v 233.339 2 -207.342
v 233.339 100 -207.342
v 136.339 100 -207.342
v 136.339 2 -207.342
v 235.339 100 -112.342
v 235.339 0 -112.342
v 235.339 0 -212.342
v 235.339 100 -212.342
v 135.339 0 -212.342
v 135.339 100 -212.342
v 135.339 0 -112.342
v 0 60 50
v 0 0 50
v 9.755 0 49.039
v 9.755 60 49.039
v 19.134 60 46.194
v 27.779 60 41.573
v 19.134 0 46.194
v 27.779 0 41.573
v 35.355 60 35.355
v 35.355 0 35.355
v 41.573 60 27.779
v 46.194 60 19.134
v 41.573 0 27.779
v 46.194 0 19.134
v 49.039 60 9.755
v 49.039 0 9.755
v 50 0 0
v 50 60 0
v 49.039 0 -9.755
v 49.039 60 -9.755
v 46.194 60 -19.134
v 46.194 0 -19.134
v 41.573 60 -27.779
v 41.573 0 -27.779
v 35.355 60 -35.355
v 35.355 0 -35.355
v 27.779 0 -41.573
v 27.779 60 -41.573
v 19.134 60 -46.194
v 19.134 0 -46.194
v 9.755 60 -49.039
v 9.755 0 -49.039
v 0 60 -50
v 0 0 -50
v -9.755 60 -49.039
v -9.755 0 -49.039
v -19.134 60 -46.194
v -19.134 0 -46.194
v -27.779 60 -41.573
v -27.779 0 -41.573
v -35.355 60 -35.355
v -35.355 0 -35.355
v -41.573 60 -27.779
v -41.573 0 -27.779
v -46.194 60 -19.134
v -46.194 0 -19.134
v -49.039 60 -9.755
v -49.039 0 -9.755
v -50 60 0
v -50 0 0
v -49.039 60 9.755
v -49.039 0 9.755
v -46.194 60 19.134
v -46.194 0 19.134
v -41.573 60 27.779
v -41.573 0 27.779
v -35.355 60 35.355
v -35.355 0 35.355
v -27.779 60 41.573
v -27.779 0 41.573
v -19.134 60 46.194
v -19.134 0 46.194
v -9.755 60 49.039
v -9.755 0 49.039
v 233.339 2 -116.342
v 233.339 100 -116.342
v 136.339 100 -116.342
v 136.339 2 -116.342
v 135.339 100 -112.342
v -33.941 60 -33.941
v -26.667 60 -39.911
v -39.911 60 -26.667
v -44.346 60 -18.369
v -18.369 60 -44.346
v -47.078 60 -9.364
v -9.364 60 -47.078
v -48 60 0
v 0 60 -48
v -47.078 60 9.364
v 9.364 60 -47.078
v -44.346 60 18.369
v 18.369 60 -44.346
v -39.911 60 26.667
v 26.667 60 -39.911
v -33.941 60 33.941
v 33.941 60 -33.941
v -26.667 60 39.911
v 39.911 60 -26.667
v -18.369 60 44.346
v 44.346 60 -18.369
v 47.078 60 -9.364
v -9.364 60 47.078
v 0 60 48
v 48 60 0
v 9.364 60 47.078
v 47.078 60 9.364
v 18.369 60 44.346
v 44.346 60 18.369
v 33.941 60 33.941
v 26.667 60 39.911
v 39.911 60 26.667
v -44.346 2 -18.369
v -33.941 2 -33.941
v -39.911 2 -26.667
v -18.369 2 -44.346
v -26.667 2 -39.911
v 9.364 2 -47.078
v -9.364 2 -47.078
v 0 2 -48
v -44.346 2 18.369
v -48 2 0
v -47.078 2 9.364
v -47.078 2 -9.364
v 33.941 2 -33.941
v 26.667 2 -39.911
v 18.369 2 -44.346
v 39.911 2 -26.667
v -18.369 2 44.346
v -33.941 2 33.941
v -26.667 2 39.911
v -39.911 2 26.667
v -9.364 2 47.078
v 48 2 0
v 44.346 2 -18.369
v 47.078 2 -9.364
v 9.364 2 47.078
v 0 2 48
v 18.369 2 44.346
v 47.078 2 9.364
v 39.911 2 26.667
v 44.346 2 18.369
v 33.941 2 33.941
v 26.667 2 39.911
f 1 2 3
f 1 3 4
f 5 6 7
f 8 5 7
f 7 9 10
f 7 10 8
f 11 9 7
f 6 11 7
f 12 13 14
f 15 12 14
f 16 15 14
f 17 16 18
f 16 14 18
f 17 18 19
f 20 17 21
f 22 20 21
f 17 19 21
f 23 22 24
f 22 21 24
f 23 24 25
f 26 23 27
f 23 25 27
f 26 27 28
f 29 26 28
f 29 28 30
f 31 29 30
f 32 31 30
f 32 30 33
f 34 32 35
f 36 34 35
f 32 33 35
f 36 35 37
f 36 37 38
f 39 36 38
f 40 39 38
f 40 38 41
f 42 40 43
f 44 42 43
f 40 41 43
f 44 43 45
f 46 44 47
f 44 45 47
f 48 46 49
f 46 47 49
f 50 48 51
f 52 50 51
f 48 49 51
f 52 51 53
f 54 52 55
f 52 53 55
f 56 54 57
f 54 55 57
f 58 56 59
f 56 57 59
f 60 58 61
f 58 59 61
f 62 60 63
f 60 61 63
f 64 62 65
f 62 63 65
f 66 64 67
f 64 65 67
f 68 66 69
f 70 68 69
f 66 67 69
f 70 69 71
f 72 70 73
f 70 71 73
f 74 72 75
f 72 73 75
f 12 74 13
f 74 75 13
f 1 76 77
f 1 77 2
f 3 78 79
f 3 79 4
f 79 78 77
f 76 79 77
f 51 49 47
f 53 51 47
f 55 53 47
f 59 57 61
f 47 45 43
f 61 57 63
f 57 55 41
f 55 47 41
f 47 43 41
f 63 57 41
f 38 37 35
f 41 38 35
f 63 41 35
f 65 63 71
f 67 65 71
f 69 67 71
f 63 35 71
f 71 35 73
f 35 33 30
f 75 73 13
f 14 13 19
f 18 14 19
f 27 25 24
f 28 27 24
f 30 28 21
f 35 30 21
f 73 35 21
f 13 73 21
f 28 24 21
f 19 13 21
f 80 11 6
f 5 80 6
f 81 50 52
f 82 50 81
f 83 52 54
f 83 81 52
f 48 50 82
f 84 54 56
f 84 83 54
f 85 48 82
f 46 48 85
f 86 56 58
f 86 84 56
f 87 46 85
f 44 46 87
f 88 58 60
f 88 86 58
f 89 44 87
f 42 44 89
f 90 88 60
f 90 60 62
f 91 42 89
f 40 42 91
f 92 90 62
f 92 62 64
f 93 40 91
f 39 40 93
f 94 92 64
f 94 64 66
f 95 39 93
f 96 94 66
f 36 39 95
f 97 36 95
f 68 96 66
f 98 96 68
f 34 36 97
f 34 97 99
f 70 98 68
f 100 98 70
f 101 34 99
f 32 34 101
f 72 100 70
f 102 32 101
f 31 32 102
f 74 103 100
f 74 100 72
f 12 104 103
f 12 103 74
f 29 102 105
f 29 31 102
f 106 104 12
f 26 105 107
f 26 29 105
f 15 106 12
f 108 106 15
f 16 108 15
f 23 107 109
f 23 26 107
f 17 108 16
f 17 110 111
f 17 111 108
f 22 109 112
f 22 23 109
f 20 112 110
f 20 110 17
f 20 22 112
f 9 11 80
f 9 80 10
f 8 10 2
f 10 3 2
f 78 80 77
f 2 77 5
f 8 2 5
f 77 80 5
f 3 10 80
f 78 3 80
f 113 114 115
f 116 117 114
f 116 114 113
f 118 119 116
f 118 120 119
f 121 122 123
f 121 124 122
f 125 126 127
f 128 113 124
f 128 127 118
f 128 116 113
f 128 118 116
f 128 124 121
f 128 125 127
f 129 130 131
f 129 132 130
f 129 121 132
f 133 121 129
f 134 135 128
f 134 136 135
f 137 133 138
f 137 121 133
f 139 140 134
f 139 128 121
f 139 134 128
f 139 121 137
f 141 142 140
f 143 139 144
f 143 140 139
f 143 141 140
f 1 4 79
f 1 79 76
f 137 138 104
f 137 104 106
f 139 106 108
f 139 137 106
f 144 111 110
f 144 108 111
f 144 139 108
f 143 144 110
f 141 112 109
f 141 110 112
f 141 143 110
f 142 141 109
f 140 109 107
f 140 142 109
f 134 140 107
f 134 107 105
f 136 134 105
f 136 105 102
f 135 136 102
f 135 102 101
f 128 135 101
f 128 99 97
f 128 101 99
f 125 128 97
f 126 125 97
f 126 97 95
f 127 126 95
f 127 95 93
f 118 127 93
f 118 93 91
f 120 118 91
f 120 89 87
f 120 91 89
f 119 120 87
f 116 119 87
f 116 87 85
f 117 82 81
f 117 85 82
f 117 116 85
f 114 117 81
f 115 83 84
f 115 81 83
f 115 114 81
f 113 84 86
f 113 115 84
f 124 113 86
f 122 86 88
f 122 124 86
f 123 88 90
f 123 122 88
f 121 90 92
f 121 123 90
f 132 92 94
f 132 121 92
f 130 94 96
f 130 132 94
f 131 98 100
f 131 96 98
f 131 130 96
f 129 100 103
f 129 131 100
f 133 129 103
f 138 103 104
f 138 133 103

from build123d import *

# Parameters (mm, degrees)
SKETCH1_R                 = 50
BOSS_EXTRUDE1_DEPTH       = 60
SHELL1_T                  = -2
SKETCH2_W                 = 100
SKETCH2_H                 = 100
BOSS_EXTRUDE2_DEPTH       = 100
SHELL2_T                  = -2
SHELL2_THICKNESS_2_FACE_W = 96
SHELL2_THICKNESS_2_FACE_H = 98
SHELL2_THICKNESS_2_DEPTH  = 3
SHELL2_THICKNESS_3_FACE_W = 93
SHELL2_THICKNESS_3_FACE_H = 98
SHELL2_THICKNESS_3_DEPTH  = 1
SHELL2_THICKNESS_4_FACE_W = 97
SHELL2_THICKNESS_4_FACE_H = 98
SHELL2_THICKNESS_4_DEPTH  = 2


with BuildPart() as part:
    # Sketch1 → Boss-Extrude1 (new body)
    with BuildSketch(Plane(origin=(0, 0, 0), x_dir=(1, 0, 0), z_dir=(0, 1, 0))):
        with Locations(Location((0, 0, 0), (0, 0, 270))):
            Circle(SKETCH1_R)
    extrude(amount=BOSS_EXTRUDE1_DEPTH)

    # Shell1
    shell1_openings = [part.faces().sort_by_distance(p)[0] for p in [
        (0, 60, 0),
    ]]
    offset(amount=SHELL1_T, openings=shell1_openings, kind=Kind.INTERSECTION)


with BuildPart() as body_2:
    # Sketch2 → Boss-Extrude2 (new body)
    with BuildSketch(Plane(origin=(0, 0, 0), x_dir=(1, 0, 0), z_dir=(0, 1, 0))):
        with Locations((185.338998585, 162.342028324)):
            Rectangle(SKETCH2_W, SKETCH2_H)
    extrude(amount=BOSS_EXTRUDE2_DEPTH)

    # Shell2
    shell2_openings = [body_2.faces().sort_by_distance(p)[0] for p in [
        (185.338998585, 100, -162.342028324),
    ]]
    offset(amount=SHELL2_T, openings=shell2_openings, kind=Kind.INTERSECTION)

    # Shell2 thickness 2 face (on inner face of the shell) → Shell2 thickness 2 (add)
    with BuildSketch(Plane(origin=(185.338998585, 51, -210.342028324), x_dir=(-1, 0, 0), z_dir=(0, 0, -1))):
        Rectangle(SHELL2_THICKNESS_2_FACE_W, SHELL2_THICKNESS_2_FACE_H)
    extrude(amount=-SHELL2_THICKNESS_2_DEPTH)

    # Shell2 thickness 3 face (on inner face of the shell) → Shell2 thickness 3 (cut)
    with BuildSketch(Plane(origin=(137.338998585, 51, -160.842028324), x_dir=(0, 0, -1), z_dir=(-1, 0, 0))):
        Rectangle(SHELL2_THICKNESS_3_FACE_W, SHELL2_THICKNESS_3_FACE_H)
    extrude(amount=SHELL2_THICKNESS_3_DEPTH, mode=Mode.SUBTRACT)

    # Shell2 thickness 4 face (on inner face of the shell) → Shell2 thickness 4 (add)
    with BuildSketch(Plane(origin=(184.838998585, 51, -114.342028324), x_dir=(1, 0, 0), z_dir=(0, 0, 1))):
        Rectangle(SHELL2_THICKNESS_4_FACE_W, SHELL2_THICKNESS_4_FACE_H)
    extrude(amount=-SHELL2_THICKNESS_4_DEPTH)


solid = Compound([part.part, body_2.part])
